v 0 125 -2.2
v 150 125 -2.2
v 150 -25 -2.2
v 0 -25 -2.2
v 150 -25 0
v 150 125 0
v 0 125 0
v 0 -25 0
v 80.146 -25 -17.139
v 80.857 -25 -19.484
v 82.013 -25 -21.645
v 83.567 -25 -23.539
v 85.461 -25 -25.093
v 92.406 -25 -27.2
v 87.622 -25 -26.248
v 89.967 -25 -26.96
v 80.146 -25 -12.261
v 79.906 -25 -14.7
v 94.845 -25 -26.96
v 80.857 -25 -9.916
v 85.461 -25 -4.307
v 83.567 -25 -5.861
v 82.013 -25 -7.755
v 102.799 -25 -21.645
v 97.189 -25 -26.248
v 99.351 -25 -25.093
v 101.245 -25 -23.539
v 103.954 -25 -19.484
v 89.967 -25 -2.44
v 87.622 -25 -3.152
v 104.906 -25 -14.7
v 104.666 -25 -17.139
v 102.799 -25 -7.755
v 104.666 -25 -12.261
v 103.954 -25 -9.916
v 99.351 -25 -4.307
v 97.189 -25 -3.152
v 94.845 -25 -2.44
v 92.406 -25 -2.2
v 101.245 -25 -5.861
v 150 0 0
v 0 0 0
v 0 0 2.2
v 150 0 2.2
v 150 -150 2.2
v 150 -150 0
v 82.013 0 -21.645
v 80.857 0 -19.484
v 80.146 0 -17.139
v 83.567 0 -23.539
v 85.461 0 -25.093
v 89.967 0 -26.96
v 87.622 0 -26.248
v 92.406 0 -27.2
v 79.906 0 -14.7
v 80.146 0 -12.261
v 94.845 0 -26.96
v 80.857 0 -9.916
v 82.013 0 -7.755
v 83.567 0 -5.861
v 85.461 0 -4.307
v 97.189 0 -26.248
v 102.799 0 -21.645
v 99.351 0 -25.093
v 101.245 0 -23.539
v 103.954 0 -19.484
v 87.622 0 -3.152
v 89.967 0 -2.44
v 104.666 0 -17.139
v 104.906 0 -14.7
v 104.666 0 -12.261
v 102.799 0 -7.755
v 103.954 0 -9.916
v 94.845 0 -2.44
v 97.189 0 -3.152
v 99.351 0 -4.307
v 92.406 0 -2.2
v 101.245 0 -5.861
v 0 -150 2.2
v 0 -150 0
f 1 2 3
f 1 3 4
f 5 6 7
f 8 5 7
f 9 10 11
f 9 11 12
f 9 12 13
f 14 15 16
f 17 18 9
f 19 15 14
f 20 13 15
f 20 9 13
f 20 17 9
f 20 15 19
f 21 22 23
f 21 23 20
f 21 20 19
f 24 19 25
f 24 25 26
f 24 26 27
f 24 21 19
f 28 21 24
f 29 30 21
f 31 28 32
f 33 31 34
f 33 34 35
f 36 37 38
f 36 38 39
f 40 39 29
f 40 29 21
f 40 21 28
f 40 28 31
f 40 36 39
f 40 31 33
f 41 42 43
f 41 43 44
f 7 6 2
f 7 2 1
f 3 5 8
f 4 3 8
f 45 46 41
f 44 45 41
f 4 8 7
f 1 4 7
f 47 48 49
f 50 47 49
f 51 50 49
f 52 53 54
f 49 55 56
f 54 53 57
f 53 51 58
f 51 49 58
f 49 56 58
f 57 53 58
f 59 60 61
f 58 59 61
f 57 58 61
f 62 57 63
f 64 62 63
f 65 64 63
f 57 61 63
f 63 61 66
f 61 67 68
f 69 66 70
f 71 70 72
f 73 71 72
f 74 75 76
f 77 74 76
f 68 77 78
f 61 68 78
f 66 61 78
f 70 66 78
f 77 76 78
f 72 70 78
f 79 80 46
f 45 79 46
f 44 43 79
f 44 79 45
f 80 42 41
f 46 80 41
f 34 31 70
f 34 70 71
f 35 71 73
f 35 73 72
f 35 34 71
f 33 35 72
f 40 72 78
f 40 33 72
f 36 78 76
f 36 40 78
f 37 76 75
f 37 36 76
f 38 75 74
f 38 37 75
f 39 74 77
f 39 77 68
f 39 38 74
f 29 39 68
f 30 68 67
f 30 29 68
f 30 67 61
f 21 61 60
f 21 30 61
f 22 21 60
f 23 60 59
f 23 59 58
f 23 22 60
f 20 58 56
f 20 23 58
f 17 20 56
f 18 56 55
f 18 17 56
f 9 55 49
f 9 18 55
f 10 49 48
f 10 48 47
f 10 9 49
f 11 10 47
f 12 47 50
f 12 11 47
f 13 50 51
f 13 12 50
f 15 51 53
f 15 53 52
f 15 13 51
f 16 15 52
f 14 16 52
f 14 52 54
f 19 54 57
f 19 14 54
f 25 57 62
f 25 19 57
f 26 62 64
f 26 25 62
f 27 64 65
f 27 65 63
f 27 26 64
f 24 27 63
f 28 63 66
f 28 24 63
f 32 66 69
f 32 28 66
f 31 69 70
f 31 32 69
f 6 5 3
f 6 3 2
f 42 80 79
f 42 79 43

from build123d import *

# Parameters (mm, degrees)
SKIZZE2_W                       = 150
SKIZZE2_H                       = 150
AUFSATZ_LINEAR_AUSTRAGEN1_DEPTH = 2.2
SKIZZE3_W                       = 150
SKIZZE3_H                       = 150
AUFSATZ_LINEAR_AUSTRAGEN3_DEPTH = 2.2
SKIZZE5_R                       = 12.5
AUFSATZ_LINEAR_AUSTRAGEN4_DEPTH = 25


with BuildPart() as part:
    # Skizze2 → Aufsatz-Linear austragen1 (new body)
    with BuildSketch(Plane.XY):
        with Locations((75, -75)):
            Rectangle(SKIZZE2_W, SKIZZE2_H)
    extrude(amount=AUFSATZ_LINEAR_AUSTRAGEN1_DEPTH)


with BuildPart() as body_2:
    # Skizze3 → Aufsatz-Linear austragen3 (new body)
    with BuildSketch(Plane(origin=(0, 0, 0), x_dir=(-1, 0, 0), z_dir=(0, 0, -1))):
        with Locations((-75, 50)):
            Rectangle(SKIZZE3_W, SKIZZE3_H)
    extrude(amount=AUFSATZ_LINEAR_AUSTRAGEN3_DEPTH)


with BuildPart() as body_3:
    # Skizze5 → Aufsatz-Linear austragen4 (new body)
    with BuildSketch(Plane(origin=(0, -25, 0), x_dir=(-1, 0, 0), z_dir=(0, -1, 0))):
        with Locations(Location((-92.405874956, 14.7, 0), (0, 0, 180))):  # turned: the seam where the file's is
            Circle(SKIZZE5_R)
    extrude(amount=-AUFSATZ_LINEAR_AUSTRAGEN4_DEPTH)


solid = Compound([part.part, body_2.part, body_3.part])
